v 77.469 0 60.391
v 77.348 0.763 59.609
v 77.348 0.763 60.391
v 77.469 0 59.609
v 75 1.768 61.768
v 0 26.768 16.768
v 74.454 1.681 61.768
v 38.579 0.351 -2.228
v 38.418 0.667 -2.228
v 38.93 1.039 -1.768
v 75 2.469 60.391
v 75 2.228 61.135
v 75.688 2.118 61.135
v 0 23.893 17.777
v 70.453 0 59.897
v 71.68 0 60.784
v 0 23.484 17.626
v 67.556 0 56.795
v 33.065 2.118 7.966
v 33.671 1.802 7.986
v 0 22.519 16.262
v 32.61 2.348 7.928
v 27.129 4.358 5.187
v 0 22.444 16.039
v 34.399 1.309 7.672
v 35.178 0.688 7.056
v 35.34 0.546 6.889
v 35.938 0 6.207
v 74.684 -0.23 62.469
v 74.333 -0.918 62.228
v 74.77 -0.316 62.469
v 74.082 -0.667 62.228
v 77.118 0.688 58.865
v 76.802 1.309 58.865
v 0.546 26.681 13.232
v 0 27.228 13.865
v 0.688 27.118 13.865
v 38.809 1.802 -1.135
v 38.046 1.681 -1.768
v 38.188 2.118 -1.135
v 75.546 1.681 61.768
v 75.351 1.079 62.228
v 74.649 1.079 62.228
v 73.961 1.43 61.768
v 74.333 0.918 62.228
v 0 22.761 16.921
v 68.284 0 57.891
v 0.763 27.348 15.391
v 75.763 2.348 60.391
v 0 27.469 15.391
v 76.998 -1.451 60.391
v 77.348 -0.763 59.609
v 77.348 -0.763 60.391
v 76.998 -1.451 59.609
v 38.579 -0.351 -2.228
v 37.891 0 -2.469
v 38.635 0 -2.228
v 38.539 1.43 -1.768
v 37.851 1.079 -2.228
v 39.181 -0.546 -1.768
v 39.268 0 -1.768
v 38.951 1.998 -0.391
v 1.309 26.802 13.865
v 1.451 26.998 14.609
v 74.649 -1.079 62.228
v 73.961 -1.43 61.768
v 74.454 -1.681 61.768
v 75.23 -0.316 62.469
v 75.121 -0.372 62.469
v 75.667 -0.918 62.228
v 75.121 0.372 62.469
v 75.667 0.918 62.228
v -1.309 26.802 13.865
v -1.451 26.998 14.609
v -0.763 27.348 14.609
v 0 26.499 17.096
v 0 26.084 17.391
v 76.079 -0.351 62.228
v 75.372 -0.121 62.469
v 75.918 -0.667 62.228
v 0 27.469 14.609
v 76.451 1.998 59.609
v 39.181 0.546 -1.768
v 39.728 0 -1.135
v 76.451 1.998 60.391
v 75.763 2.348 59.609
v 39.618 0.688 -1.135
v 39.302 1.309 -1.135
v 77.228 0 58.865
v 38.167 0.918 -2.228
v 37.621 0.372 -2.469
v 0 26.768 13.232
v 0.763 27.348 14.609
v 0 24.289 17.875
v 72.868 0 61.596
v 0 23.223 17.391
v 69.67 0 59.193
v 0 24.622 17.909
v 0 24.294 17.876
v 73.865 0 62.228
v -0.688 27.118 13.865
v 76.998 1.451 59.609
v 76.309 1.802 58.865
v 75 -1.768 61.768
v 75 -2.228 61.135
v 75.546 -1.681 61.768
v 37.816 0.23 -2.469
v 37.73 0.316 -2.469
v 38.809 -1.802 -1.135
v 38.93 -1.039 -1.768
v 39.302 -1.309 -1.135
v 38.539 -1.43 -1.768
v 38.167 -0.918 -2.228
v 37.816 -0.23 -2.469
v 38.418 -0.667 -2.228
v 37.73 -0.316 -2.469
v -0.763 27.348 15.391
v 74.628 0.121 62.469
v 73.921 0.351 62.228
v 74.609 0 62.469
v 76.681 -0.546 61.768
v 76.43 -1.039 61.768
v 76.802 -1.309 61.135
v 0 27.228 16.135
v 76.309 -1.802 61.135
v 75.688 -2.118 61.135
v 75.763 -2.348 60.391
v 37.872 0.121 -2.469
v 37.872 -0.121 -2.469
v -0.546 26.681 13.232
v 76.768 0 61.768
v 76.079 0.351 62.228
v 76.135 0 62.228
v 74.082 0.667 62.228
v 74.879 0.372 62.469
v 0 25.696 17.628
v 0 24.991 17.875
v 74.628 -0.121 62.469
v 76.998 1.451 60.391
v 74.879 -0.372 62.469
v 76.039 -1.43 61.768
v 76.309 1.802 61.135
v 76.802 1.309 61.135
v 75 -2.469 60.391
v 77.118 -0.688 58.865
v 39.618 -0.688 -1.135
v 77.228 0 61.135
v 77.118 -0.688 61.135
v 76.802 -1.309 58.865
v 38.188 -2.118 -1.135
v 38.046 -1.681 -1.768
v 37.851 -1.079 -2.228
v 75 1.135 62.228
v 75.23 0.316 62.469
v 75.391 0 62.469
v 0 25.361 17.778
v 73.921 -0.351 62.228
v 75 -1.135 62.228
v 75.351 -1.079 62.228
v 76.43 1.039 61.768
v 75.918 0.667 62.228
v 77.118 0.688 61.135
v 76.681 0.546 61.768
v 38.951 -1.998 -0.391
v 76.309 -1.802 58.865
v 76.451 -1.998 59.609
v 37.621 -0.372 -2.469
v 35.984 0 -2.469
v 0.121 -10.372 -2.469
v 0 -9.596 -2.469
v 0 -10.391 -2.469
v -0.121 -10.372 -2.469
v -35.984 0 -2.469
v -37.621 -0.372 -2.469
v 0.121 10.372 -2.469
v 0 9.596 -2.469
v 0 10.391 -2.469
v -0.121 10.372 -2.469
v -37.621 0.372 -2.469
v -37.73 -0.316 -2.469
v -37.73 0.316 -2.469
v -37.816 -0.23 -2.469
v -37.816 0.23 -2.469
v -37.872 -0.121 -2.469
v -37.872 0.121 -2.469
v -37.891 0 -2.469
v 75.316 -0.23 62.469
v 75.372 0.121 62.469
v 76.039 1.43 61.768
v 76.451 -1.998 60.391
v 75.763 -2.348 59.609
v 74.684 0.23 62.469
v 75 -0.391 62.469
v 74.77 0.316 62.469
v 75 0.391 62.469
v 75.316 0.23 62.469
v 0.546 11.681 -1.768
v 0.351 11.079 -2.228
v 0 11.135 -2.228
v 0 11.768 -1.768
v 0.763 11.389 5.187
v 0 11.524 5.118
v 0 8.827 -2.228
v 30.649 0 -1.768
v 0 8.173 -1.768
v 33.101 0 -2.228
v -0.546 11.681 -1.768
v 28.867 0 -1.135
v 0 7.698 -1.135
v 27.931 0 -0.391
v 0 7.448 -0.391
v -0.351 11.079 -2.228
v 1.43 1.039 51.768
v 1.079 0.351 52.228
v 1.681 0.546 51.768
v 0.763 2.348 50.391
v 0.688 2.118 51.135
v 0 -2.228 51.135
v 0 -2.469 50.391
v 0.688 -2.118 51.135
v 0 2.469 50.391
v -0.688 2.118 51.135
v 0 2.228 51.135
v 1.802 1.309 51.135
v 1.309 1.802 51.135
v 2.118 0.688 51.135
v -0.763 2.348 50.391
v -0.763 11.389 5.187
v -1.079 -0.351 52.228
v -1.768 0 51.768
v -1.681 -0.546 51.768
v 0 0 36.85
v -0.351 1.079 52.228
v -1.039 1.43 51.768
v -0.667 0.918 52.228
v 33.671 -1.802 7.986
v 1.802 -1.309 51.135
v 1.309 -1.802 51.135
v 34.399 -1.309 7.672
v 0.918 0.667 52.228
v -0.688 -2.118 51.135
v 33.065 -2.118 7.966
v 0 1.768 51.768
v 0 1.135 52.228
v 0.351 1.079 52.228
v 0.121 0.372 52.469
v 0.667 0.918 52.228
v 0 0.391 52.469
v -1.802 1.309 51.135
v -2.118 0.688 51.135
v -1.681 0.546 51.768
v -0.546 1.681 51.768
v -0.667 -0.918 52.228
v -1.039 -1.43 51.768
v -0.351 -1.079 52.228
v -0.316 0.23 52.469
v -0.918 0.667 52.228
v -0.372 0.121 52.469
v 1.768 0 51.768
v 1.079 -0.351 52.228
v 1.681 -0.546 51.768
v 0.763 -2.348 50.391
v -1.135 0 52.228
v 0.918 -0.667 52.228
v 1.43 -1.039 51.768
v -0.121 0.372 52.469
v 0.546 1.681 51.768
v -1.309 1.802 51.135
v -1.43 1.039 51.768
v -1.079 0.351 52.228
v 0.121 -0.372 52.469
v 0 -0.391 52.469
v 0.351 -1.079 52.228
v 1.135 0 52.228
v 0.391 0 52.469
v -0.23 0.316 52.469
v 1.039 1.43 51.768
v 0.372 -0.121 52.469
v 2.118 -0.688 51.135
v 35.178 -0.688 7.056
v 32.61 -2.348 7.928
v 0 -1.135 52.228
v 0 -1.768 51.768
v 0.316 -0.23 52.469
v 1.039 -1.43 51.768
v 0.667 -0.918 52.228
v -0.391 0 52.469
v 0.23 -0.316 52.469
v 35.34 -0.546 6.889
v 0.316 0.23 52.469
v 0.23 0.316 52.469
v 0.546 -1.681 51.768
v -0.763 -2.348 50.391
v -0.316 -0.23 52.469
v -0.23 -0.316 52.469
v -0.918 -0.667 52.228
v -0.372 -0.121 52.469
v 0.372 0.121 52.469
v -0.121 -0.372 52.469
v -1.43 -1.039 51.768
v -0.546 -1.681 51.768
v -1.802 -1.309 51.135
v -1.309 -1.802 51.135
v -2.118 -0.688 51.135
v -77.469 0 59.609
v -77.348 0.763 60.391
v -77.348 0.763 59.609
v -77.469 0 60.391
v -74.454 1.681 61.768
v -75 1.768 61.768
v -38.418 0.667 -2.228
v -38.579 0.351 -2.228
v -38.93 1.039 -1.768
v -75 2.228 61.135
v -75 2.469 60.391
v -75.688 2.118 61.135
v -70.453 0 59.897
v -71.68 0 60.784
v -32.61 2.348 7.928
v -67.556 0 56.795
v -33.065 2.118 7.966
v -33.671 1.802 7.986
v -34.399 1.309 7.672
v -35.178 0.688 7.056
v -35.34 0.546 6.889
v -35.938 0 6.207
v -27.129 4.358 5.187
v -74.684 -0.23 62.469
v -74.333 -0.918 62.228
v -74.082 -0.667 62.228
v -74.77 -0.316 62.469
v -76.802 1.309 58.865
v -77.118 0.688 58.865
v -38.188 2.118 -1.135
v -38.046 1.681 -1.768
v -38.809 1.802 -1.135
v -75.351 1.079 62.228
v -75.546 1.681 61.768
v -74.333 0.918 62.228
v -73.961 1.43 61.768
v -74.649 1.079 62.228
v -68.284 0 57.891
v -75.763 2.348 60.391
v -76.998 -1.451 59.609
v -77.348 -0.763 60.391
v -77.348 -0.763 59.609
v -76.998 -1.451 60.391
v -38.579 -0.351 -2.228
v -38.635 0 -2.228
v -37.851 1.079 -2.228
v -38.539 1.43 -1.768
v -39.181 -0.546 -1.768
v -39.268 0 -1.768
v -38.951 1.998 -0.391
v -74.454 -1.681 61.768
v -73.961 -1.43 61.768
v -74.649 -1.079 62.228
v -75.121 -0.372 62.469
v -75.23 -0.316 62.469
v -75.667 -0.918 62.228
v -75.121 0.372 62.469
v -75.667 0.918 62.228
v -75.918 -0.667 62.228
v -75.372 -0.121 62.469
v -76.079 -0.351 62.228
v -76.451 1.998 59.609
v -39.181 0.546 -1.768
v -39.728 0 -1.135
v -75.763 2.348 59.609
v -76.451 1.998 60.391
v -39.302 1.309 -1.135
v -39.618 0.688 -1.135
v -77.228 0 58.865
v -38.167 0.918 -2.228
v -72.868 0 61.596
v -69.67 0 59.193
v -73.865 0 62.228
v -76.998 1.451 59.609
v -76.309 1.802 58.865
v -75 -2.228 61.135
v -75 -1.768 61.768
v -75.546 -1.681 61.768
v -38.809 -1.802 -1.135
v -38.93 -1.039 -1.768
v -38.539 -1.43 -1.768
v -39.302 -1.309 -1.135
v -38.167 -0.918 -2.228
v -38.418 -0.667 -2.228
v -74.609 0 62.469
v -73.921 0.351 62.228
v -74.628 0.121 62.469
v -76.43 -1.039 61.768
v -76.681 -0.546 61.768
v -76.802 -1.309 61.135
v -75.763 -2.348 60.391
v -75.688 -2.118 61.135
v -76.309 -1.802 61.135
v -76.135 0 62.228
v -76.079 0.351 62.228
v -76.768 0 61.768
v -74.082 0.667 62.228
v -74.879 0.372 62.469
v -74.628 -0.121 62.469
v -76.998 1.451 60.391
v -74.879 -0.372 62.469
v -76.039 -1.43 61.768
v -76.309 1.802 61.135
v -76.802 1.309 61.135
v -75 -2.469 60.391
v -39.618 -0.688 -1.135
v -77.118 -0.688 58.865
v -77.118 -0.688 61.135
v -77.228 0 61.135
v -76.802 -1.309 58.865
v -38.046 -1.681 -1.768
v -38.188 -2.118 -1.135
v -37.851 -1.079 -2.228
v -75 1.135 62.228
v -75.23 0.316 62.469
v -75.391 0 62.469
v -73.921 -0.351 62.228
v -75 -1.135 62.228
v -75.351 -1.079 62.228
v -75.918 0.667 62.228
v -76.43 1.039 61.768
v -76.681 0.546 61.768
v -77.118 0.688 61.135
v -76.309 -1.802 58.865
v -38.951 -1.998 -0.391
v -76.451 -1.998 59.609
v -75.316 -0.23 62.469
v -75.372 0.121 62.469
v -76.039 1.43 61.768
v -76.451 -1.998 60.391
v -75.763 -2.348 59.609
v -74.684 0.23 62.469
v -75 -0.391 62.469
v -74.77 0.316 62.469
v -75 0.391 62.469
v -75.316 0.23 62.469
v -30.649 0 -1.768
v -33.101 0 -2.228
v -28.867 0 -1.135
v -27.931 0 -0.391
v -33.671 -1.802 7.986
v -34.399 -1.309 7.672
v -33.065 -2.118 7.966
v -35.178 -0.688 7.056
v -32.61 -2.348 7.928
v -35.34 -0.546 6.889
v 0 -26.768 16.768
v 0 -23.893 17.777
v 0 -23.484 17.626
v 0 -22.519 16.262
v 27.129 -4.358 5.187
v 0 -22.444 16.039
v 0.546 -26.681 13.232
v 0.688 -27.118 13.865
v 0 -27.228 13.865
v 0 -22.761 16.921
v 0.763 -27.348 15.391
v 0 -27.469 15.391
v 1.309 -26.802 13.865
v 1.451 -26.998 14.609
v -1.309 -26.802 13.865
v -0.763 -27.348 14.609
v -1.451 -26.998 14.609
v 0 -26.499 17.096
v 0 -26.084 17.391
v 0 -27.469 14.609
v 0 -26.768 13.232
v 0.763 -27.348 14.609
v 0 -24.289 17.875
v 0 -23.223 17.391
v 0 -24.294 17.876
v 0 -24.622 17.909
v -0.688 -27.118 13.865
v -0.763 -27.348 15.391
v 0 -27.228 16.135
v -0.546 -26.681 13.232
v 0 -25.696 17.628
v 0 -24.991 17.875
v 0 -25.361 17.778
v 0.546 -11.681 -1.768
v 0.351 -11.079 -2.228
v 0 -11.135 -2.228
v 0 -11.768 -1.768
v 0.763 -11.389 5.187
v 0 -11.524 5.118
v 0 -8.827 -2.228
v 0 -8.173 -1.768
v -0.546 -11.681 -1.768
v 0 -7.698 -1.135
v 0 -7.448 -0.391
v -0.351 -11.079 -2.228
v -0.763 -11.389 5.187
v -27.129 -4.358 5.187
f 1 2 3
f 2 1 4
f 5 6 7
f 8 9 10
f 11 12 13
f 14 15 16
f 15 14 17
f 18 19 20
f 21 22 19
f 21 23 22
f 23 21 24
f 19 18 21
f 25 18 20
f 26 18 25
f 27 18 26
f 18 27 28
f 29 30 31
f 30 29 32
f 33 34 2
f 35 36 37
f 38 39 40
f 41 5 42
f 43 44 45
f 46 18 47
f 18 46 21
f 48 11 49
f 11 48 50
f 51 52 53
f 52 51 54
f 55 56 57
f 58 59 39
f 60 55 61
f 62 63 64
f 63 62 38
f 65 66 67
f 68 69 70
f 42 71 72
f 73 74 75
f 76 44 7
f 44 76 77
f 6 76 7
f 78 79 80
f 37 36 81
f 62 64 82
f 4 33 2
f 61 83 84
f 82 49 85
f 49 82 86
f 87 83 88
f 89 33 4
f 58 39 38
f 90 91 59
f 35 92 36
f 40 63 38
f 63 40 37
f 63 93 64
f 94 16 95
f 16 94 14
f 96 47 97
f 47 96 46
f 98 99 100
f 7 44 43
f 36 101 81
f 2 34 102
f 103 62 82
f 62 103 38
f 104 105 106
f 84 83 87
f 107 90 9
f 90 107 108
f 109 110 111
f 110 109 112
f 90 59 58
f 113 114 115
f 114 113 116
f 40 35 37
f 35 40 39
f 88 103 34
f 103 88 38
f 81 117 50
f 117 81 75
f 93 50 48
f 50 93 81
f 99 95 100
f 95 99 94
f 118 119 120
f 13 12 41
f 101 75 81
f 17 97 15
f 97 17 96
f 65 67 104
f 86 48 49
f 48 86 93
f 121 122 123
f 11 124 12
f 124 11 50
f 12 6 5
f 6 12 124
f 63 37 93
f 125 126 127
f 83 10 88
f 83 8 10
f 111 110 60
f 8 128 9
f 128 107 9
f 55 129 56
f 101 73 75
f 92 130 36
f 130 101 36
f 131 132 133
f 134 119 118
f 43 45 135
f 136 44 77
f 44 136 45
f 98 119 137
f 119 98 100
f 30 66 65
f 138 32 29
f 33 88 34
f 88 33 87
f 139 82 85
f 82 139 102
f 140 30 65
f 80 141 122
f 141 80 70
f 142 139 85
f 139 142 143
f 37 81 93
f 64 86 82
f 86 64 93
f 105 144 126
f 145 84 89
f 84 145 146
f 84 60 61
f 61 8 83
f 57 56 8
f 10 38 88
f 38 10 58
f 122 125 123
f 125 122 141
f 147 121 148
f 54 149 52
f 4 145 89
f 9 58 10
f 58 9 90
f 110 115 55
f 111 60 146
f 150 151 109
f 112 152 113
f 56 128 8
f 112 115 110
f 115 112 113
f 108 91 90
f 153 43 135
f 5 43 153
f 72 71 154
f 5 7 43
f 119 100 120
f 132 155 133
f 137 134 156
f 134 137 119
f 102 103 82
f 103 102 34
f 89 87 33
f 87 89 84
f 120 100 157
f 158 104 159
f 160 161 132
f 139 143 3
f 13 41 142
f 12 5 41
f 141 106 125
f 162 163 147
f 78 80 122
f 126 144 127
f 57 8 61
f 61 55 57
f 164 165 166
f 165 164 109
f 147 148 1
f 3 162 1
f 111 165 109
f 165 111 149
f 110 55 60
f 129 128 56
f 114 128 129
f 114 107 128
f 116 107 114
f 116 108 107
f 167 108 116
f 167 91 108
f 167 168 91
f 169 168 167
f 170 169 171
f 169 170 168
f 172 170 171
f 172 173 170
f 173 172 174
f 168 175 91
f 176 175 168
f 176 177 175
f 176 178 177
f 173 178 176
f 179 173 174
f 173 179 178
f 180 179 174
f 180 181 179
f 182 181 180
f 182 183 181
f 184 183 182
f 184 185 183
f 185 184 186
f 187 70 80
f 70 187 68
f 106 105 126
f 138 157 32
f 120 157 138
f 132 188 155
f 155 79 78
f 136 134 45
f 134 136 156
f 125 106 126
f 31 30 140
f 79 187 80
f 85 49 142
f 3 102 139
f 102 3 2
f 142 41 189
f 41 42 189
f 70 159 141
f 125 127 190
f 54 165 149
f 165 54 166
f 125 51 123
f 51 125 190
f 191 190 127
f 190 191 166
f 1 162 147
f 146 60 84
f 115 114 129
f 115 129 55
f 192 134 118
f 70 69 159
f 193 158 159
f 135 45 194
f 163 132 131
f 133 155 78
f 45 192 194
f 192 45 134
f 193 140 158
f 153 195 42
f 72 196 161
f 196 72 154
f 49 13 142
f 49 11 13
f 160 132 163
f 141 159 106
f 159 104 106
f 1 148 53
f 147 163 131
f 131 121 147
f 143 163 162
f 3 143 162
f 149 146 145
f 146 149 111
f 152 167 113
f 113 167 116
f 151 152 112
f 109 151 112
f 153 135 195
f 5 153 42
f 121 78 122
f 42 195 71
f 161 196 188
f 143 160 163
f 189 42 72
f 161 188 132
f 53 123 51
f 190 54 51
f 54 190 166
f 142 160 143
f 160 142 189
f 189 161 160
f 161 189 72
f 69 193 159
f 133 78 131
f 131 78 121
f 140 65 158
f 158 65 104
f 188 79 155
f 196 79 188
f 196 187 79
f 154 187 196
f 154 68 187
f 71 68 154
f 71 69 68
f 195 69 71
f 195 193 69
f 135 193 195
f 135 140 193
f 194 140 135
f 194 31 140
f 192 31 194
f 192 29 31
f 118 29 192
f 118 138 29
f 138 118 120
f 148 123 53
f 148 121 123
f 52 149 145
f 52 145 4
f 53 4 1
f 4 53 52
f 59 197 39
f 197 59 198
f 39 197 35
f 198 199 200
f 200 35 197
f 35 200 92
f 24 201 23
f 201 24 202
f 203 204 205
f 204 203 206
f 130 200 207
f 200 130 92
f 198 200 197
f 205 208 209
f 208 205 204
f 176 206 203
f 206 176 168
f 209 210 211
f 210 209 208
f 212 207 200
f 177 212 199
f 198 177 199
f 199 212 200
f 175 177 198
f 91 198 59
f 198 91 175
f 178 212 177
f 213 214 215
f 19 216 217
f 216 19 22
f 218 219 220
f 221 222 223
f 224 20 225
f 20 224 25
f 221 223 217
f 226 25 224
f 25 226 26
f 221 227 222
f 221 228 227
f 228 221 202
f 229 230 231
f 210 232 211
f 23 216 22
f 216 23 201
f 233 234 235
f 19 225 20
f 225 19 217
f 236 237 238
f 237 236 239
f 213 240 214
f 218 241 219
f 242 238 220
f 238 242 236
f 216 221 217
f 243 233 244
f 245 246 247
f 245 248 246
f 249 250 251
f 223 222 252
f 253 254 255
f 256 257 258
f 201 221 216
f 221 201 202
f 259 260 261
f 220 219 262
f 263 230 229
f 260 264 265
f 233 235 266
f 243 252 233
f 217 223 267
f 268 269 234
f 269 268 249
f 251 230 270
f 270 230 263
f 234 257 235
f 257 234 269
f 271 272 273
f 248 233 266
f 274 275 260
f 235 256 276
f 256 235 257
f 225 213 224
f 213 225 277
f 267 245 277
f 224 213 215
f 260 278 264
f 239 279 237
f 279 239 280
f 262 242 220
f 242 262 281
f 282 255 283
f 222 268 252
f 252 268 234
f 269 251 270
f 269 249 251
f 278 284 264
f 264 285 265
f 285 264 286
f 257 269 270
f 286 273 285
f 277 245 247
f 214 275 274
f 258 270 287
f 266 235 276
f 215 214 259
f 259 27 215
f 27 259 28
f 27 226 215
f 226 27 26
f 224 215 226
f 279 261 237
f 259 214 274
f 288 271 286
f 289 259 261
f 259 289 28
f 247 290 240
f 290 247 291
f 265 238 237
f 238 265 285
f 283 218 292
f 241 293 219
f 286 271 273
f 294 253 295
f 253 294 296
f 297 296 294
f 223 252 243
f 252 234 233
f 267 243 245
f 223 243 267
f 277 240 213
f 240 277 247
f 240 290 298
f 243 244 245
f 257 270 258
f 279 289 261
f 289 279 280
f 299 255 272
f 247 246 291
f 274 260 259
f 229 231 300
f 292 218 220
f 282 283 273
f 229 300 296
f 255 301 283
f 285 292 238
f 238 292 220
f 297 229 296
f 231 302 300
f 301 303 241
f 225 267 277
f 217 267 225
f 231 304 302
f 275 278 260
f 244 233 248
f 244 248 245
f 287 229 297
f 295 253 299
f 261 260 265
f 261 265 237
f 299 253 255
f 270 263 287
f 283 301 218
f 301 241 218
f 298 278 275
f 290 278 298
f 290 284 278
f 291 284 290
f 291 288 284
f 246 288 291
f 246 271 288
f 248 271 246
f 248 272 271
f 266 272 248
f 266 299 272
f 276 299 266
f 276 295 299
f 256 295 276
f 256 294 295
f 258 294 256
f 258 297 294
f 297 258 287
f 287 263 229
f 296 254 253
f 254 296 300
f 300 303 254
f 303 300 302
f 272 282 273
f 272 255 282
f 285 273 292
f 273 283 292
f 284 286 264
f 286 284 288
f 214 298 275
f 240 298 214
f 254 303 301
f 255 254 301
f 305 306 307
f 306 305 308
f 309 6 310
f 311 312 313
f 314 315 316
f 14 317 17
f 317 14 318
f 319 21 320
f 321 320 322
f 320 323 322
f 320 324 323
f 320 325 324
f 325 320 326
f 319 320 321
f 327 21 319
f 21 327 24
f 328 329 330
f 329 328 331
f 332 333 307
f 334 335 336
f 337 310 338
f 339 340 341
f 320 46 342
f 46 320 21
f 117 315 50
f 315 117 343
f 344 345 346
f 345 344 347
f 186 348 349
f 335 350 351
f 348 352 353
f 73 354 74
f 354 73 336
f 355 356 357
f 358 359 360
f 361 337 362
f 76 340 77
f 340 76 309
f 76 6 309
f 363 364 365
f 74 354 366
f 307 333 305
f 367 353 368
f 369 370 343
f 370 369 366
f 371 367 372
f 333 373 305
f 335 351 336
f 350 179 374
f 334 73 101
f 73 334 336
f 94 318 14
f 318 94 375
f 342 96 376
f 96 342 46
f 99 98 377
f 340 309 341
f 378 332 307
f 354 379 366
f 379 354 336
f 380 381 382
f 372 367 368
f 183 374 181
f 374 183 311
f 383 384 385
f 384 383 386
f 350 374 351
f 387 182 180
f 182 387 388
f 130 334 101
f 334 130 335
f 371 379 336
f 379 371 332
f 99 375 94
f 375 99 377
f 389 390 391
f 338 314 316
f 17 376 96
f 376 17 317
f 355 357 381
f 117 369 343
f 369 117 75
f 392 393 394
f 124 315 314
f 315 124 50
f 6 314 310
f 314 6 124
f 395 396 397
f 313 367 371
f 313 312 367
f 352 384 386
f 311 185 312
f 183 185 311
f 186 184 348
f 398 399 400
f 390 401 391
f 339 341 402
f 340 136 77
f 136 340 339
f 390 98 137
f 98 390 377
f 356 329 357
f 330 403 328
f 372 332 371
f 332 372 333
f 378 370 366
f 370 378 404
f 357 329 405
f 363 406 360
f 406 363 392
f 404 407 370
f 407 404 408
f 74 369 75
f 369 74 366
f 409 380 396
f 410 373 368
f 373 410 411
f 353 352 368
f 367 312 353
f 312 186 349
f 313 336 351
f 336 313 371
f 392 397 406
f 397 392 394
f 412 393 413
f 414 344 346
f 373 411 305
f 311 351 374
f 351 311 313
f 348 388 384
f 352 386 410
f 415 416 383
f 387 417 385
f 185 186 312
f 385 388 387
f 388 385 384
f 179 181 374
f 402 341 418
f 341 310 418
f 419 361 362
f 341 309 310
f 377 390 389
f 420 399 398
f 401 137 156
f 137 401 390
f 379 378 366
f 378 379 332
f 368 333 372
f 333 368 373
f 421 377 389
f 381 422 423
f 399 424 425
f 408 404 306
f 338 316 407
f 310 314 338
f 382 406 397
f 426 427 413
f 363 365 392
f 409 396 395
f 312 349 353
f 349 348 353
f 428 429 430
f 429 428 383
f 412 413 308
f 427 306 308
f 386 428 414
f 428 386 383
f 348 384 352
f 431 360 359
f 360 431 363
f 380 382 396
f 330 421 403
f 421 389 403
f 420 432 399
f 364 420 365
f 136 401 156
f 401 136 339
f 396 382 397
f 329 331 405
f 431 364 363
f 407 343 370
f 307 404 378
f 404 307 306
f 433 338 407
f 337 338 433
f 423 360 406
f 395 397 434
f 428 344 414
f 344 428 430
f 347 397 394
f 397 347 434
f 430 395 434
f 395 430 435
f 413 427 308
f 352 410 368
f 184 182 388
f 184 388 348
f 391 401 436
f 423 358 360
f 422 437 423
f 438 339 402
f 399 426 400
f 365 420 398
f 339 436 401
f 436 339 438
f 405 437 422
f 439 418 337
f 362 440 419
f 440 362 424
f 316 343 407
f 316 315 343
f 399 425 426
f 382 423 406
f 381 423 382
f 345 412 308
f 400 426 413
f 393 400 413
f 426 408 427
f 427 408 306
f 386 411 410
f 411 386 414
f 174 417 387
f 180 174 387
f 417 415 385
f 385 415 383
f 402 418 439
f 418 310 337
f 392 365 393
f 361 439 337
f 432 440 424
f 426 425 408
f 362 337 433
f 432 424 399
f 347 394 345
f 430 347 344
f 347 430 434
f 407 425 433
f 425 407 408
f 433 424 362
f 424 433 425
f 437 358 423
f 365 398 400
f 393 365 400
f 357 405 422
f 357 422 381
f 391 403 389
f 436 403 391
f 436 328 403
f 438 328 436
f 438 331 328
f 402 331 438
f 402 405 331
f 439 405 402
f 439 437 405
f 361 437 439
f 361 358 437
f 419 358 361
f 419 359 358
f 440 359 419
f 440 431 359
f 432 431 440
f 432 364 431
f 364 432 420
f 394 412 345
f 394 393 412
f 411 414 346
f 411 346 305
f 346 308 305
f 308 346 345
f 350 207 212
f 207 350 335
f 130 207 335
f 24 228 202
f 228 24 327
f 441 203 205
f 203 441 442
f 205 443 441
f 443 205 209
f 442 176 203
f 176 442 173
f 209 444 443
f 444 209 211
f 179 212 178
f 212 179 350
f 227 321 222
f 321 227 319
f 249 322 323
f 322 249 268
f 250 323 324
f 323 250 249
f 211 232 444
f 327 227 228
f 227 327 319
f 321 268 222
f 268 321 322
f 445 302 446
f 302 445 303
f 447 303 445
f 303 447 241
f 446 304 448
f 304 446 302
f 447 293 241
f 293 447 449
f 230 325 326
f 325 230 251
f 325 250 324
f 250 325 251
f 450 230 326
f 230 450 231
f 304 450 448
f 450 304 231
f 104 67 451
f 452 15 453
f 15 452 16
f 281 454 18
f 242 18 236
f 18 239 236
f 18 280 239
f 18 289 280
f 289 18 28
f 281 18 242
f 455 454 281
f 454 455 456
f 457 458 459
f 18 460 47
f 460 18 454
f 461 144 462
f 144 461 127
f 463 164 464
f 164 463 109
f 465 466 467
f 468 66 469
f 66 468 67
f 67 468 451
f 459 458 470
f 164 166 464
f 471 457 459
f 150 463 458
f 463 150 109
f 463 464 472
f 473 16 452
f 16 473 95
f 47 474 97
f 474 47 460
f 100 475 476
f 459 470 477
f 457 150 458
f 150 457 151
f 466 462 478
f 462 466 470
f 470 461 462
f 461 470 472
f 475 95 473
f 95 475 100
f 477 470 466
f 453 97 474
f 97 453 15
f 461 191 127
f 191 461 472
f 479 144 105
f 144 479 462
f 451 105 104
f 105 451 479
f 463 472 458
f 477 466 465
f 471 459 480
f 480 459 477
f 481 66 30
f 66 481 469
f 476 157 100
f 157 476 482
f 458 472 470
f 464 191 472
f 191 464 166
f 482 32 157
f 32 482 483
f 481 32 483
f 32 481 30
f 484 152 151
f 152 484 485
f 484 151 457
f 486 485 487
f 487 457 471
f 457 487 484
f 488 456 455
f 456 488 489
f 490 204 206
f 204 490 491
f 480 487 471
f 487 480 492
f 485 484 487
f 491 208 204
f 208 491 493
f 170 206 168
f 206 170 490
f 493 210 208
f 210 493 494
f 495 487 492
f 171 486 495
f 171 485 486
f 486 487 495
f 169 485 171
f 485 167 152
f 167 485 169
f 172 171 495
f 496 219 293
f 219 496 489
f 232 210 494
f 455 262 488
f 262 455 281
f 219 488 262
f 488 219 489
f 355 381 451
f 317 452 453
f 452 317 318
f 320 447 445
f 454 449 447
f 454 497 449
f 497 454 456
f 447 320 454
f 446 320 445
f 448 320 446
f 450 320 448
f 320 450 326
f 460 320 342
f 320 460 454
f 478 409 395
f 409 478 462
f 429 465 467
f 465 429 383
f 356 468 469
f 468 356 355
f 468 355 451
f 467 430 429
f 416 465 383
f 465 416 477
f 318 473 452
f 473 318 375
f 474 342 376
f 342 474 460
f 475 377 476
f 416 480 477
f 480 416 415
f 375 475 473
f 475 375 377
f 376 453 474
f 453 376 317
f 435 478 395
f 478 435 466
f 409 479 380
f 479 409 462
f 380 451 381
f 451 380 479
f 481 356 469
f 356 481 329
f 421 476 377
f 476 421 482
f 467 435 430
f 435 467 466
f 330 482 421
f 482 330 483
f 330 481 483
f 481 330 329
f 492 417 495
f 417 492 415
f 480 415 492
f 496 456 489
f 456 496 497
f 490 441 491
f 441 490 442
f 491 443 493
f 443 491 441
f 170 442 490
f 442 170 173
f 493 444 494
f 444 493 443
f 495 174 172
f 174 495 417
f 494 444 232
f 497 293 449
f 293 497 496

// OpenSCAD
/*
   origami ship

   Kit Wallace

*/
// length of bow from centre
lb=15; 
// height of bow
hb=12;
// width midships
wm=5; 
// height midships
hm=3; 
// waterline length e.g. from centre eg. half length of bow
wl=7.5; 
// width of hull from centre
wh=2; 
// height of sail
h=10; 
//Thickness of paper
thickness=1;
// sphere quality
steps = 20;
// overall scale
scale=5;


module double(axis) { 
      union() {
          children();
          mirror(axis) children();
      }
  }
module plane(s,t=0.5) {
    hull()
    for (i=[0:len(s) -1])
       translate(s[i]) sphere(t/2);     
    } 

module ground(size=50) {
   translate([0,0,-size]) cube(2*size,center=true);
}

p1=[lb,0,hb];
p2=[wl,0,0];
p3=[0,wm,hm];
p5=[0,0,h];
p4=[0,wh,0];

module ship_q(t) {
   plane([p1,p2,p3],t);
   plane([p2,p3,p4],t);
   plane([p4,p2,p5],t);
};

$fn=steps;
scale(scale) 
 difference() {
  double([0,1,0]) 
     double([1,0,0]) 
         ship_q(thickness); 
 * ground();
 }
